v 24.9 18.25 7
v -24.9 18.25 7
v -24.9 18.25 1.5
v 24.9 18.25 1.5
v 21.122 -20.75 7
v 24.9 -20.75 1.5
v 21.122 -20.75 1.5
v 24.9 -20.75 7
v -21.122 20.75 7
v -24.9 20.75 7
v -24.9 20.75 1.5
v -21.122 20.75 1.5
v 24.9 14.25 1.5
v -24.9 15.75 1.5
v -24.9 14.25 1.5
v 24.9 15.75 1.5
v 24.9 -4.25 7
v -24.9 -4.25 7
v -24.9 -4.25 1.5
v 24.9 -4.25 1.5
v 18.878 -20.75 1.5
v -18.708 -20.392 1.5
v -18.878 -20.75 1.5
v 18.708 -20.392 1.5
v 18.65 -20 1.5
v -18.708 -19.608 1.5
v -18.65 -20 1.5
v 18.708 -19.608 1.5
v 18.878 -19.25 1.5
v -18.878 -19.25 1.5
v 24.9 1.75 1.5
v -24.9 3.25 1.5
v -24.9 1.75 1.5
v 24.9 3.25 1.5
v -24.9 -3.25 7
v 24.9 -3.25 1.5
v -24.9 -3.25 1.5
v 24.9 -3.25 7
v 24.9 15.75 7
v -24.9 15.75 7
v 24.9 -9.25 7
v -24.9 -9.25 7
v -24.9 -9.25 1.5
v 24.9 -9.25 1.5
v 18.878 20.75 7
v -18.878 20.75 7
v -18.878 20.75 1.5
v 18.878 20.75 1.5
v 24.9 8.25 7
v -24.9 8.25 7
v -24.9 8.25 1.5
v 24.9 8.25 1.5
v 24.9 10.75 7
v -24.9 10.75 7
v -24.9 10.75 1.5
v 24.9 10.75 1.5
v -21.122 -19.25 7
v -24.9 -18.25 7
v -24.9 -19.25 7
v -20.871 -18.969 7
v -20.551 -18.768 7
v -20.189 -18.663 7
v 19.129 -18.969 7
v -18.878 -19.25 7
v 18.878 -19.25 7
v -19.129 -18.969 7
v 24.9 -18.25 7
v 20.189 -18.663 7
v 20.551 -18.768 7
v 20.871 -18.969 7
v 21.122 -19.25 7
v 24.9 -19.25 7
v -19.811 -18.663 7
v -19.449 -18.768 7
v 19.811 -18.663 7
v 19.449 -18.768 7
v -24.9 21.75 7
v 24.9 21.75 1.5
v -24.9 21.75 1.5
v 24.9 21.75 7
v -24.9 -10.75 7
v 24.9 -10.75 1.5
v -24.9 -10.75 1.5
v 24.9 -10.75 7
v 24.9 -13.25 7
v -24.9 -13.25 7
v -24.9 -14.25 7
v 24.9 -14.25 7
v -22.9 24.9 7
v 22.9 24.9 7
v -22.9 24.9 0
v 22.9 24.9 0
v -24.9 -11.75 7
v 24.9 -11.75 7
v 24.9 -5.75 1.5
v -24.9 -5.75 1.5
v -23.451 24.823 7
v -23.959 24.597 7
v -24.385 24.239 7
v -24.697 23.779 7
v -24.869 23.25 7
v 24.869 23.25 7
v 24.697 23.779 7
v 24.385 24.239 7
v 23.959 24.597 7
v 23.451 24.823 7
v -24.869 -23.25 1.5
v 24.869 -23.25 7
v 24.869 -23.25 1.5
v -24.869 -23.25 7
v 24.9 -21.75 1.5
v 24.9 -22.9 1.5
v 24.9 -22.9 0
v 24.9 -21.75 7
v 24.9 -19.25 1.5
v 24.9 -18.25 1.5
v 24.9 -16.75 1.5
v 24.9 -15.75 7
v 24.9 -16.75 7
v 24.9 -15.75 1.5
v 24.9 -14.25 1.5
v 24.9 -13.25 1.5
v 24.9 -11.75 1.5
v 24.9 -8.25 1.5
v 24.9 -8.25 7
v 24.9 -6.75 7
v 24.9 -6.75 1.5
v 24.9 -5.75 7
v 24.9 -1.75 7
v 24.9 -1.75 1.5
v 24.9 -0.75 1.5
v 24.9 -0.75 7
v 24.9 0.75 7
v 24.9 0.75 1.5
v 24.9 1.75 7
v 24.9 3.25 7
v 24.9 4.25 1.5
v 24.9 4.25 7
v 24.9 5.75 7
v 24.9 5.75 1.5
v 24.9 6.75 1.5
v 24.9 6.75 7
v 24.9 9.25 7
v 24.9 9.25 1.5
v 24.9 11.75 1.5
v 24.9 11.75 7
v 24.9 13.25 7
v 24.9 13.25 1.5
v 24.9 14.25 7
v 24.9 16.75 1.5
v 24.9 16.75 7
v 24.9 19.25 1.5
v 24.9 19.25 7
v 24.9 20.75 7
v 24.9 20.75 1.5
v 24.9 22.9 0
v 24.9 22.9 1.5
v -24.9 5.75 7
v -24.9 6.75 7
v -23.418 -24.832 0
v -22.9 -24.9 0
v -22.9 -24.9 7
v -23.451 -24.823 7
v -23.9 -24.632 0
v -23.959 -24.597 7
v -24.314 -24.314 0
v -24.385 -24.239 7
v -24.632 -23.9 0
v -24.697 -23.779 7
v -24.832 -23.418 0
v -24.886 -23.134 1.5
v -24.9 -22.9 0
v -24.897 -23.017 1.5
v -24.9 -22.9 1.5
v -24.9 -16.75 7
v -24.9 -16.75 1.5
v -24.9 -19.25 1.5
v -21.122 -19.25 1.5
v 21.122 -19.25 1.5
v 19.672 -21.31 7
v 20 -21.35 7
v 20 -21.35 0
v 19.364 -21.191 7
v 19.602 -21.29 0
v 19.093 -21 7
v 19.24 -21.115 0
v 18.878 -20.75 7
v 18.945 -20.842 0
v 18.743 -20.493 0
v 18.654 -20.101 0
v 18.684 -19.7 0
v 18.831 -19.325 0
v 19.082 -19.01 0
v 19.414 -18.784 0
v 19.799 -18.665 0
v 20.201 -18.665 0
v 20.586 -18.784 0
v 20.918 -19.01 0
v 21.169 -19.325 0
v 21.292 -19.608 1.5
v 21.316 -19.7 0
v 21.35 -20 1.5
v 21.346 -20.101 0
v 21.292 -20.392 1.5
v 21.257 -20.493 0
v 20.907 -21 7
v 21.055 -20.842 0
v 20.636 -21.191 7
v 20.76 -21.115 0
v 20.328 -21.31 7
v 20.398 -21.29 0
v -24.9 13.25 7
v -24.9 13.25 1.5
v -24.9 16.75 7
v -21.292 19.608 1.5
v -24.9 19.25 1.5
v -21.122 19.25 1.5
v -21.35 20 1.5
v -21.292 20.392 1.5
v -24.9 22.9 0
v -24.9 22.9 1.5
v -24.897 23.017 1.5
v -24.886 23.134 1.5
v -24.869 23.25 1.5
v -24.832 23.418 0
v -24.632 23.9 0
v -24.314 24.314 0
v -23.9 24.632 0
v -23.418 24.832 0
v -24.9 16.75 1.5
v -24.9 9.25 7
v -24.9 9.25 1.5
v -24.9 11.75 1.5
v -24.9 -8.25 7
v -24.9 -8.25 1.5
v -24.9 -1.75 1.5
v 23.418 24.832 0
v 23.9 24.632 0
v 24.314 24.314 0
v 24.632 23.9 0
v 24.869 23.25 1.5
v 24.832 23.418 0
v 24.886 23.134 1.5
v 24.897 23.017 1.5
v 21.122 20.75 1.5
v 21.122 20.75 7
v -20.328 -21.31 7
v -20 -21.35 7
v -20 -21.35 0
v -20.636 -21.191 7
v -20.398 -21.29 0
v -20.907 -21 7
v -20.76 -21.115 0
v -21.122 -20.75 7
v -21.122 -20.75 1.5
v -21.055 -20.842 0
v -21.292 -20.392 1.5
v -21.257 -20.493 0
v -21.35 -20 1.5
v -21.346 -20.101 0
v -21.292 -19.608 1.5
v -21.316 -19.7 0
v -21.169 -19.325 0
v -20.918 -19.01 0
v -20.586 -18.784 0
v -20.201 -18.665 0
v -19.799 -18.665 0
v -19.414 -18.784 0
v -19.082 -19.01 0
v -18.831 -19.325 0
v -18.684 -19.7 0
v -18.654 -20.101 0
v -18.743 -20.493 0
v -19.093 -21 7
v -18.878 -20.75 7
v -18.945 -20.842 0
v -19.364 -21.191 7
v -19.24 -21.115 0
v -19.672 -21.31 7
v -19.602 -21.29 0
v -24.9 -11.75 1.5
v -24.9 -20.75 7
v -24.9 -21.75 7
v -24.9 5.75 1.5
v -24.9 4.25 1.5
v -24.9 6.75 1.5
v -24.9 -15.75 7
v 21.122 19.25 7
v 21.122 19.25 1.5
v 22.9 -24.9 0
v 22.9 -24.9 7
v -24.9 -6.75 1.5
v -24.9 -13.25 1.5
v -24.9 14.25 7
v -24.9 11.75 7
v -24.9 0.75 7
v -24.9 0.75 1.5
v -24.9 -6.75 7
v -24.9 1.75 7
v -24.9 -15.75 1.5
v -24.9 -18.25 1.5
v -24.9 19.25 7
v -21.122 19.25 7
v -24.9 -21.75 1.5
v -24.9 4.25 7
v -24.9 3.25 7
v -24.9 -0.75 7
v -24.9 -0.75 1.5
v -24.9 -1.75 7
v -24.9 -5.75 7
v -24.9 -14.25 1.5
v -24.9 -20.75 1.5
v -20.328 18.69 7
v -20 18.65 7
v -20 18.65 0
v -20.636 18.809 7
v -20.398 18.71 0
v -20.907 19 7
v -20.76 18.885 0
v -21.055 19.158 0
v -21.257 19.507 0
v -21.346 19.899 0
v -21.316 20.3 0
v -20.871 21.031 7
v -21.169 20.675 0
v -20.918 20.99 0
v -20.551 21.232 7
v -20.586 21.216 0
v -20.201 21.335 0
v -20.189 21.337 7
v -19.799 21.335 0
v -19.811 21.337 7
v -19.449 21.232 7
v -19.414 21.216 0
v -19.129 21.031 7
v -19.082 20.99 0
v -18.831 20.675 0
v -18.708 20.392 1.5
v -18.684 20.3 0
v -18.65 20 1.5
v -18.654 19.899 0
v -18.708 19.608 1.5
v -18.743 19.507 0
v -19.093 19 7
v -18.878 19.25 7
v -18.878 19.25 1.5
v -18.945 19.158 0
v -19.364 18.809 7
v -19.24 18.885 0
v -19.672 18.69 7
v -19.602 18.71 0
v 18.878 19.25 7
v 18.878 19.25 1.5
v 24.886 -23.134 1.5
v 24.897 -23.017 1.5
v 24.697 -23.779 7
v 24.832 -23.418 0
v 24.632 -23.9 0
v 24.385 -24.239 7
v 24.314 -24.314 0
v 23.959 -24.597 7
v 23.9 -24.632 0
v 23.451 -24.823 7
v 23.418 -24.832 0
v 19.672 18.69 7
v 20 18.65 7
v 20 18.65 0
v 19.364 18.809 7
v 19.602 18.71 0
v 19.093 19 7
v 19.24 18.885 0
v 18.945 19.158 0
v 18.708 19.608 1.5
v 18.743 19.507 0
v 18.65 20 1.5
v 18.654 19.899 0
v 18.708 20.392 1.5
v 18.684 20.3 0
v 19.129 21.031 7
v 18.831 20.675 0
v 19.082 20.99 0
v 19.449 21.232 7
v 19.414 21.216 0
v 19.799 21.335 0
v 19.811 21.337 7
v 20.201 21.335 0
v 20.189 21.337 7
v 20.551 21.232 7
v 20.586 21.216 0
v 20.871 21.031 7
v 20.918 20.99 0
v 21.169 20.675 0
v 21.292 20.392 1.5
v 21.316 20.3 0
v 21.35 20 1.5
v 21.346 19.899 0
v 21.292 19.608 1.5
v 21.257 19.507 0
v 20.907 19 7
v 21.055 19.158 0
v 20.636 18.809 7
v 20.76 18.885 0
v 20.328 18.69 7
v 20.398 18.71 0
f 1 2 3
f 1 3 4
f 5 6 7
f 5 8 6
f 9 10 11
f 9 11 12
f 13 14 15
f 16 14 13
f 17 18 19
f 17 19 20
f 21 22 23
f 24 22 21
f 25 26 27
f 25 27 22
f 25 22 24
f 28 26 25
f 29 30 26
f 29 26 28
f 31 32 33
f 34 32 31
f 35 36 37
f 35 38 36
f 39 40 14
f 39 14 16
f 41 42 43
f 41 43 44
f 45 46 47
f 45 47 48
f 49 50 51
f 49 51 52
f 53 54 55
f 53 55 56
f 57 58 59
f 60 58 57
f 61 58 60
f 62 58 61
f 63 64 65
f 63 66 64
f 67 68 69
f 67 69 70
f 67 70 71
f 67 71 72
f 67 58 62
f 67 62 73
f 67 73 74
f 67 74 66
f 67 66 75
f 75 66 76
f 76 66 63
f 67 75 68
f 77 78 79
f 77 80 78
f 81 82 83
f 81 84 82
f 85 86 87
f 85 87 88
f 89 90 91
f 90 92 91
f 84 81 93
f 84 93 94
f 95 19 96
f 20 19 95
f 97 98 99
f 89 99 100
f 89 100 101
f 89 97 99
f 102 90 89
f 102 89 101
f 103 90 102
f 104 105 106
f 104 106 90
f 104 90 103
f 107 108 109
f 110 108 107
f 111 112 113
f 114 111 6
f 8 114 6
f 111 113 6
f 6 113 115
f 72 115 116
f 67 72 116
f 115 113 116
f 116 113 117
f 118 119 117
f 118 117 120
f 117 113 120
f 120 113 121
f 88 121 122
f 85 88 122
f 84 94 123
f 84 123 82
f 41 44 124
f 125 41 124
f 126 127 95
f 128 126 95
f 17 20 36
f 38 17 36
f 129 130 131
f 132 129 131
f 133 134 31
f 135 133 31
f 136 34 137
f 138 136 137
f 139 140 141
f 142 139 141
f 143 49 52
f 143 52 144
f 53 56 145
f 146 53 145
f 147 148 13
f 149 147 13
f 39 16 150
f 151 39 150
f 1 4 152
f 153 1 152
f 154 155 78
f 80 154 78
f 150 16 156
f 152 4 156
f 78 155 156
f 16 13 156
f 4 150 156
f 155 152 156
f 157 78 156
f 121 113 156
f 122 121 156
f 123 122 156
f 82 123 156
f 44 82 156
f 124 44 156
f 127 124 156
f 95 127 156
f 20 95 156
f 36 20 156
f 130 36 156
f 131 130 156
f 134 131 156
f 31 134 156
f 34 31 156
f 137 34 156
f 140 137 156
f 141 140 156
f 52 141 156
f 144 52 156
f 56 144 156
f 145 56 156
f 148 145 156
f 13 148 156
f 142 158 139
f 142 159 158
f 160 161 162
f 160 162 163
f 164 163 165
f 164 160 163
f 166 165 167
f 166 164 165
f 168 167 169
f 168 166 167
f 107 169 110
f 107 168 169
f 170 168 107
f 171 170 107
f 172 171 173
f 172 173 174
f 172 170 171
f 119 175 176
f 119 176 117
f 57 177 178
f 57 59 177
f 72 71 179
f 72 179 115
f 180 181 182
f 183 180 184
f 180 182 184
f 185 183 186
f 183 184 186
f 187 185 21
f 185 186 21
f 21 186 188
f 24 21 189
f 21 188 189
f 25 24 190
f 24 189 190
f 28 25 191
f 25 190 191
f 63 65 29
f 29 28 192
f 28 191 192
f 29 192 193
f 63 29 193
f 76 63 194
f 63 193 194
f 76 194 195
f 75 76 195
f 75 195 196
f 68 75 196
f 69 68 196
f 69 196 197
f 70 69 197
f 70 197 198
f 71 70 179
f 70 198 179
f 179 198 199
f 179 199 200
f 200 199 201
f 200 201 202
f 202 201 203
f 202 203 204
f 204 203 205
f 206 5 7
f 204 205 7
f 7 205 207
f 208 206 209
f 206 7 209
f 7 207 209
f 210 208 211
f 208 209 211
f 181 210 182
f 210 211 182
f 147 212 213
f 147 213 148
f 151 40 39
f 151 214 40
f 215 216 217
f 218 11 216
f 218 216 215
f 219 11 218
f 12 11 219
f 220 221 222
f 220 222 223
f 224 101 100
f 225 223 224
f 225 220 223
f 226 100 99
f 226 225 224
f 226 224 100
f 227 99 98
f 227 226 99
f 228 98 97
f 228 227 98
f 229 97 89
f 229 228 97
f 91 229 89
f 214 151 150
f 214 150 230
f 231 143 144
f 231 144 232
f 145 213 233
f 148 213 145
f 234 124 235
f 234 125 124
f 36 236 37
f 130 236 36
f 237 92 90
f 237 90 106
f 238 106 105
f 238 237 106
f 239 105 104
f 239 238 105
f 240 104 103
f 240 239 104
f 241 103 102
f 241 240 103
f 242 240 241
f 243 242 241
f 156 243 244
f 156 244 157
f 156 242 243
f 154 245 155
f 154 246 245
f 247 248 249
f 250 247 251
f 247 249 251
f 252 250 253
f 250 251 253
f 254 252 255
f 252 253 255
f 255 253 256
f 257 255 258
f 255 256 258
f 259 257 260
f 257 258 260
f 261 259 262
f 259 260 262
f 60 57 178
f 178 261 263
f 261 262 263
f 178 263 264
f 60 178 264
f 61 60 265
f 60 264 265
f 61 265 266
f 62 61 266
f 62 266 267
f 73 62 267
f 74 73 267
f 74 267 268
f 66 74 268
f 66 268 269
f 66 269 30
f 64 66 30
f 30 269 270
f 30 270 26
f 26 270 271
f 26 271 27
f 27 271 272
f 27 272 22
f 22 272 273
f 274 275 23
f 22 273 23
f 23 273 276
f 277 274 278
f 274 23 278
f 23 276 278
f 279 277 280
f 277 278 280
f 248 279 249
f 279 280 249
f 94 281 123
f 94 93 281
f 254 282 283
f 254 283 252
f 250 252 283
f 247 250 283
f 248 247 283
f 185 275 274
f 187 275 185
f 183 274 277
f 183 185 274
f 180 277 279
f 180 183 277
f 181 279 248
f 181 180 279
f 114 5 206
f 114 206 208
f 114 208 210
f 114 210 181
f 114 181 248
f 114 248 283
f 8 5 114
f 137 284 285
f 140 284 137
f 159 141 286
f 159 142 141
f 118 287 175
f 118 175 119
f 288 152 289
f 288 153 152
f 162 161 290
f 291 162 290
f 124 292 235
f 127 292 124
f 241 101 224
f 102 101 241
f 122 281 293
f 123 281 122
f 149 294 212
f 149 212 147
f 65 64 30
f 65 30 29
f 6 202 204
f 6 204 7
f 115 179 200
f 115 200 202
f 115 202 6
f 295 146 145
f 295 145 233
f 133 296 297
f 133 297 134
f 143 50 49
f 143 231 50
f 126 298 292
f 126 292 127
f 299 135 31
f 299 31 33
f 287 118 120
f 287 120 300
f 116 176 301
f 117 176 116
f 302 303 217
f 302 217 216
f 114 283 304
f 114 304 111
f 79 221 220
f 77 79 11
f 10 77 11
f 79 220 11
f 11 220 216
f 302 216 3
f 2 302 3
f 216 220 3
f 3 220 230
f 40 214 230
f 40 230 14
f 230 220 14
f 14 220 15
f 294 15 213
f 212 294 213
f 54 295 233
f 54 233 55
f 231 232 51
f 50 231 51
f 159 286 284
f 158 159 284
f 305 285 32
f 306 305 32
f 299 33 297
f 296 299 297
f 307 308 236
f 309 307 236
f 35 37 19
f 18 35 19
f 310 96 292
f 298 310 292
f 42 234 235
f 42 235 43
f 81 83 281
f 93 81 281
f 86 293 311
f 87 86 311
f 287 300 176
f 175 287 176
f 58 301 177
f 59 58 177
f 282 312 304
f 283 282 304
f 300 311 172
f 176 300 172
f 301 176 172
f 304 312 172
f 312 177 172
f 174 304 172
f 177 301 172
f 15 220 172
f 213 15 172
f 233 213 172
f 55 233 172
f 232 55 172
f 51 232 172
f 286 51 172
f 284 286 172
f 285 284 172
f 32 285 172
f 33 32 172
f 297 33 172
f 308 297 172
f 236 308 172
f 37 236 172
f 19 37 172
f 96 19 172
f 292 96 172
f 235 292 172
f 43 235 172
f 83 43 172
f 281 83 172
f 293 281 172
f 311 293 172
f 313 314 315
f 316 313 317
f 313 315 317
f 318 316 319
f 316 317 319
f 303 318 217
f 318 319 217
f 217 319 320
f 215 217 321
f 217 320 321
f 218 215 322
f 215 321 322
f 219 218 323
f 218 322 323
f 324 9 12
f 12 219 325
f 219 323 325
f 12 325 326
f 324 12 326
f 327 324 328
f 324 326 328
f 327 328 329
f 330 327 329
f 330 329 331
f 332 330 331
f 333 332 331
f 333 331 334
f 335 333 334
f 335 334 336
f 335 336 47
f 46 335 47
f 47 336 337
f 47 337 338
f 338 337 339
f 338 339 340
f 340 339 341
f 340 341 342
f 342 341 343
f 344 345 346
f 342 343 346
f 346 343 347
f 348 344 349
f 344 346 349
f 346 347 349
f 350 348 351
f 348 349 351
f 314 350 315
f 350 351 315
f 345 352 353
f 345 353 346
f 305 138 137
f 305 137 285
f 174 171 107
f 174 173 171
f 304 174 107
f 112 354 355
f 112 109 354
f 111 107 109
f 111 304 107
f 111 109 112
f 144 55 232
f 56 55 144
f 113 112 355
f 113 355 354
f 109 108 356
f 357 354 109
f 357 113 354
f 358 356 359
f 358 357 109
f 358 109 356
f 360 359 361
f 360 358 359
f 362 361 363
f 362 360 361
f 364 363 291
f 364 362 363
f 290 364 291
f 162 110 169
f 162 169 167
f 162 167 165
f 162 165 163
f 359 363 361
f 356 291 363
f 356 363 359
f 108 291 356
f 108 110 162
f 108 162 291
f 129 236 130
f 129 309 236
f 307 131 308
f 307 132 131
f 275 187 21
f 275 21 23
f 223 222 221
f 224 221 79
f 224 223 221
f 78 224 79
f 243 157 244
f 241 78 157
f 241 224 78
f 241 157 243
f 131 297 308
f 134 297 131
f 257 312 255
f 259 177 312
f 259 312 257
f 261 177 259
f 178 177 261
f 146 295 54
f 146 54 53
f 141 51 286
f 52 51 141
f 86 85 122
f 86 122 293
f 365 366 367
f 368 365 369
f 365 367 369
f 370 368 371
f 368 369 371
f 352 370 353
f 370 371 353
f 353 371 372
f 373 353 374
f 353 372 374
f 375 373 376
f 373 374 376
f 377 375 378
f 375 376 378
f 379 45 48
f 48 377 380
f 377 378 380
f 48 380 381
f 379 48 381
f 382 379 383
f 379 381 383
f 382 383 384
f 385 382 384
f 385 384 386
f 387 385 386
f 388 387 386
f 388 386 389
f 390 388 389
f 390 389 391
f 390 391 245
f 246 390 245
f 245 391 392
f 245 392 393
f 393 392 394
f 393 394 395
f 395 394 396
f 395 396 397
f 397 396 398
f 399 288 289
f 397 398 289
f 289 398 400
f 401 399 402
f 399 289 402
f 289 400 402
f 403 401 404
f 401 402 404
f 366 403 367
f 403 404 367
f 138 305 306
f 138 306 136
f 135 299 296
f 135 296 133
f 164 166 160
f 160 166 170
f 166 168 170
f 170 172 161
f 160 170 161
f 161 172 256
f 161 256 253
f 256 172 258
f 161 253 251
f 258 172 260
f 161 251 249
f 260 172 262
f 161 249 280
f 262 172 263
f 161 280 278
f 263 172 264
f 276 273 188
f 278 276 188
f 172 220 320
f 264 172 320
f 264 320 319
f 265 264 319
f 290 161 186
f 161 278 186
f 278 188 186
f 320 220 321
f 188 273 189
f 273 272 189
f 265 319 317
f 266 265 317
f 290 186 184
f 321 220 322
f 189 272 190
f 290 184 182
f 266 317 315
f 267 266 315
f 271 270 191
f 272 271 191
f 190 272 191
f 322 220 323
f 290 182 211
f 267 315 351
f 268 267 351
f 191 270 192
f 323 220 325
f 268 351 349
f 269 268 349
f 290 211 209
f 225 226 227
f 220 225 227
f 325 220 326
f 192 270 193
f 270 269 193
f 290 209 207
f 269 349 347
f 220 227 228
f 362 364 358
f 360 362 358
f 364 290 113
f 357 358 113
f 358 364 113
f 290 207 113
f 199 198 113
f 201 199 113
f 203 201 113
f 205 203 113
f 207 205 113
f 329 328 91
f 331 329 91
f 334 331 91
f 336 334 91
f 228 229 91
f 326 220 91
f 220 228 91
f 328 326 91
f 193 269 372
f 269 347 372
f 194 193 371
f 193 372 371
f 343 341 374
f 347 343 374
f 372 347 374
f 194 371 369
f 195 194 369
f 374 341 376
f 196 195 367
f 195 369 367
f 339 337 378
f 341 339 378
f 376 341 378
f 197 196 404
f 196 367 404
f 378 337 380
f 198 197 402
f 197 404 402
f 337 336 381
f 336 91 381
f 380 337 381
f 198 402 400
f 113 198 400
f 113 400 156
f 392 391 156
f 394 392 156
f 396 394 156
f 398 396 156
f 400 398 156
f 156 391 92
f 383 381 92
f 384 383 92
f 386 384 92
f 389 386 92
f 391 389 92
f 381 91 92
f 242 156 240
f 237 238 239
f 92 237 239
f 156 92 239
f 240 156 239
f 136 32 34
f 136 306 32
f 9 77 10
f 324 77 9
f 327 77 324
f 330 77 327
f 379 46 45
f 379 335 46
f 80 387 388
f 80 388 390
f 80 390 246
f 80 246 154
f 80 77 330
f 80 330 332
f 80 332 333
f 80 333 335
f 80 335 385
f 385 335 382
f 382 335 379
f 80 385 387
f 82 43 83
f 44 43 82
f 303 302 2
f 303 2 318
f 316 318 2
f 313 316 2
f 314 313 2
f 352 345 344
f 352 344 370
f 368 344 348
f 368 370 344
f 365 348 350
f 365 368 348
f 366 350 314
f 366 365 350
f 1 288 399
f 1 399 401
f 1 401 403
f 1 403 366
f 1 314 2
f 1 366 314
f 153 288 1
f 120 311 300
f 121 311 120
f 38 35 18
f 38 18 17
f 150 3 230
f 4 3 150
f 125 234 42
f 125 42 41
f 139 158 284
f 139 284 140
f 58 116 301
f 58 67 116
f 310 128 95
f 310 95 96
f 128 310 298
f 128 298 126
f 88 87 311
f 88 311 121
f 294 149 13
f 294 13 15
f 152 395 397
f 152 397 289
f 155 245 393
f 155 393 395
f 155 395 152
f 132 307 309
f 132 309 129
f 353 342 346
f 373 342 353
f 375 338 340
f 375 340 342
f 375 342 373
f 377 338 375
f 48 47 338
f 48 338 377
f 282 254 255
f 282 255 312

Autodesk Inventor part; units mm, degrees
ref_plane "YZ Plane" through (0, 0, 0) normal (1, 0, 0) x (0, 1, 0)
ref_plane "XZ Plane" through (0, 0, 0) normal (0, 1, 0) x (-1, 0, 0)
ref_plane "XY Plane" through (0, 0, 0) normal (0, 0, 1) x (1, 0, 0)
ref_plane "Arbeitsebene1" through (0, 0, 0) normal (0, 0, 1) x (1, 0, 0)
sketch "Skizze1" plane through (0, 0, 0) normal (0, 0, 1) x (1, 0, 0)
  arc A0 (-22.9, 24.9) -> (-24.9, 22.9) centre (-22.9, 22.9) ccw projected
  line L0 (-24.9, 22.9) -> (-24.9, -22.9) projected
  arc A1 (-24.9, -22.9) -> (-22.9, -24.9) centre (-22.9, -22.9) ccw projected
  line L1 (-22.9, -24.9) -> (22.9, -24.9) projected
  arc A2 (22.9, -24.9) -> (24.9, -22.9) centre (22.9, -22.9) ccw projected
  line L2 (24.9, -22.9) -> (24.9, 22.9) projected
  arc A3 (24.9, 22.9) -> (22.9, 24.9) centre (22.9, 22.9) ccw projected
  line L3 (22.9, 24.9) -> (-22.9, 24.9) projected
  circle A4 centre (20, 20) radius 1.6 projected
  circle A5 centre (-20, -20) radius 1.6 projected
  circle A6 centre (20, -20) radius 1.6 projected
  circle A7 centre (-20, 20) radius 1.6 projected
  arc A8 (6.7383, -21.066) -> (8.3017, -21.066) centre (7.52, -20.62) ccw projected
  line L4 (6.7383, -21.066) -> (-6.9383, -21.066) projected
  arc A9 (-8.5017, -21.066) -> (-6.9383, -21.066) centre (-7.72, -20.62) ccw projected
  line L5 (-8.5017, -21.066) -> (-17.9, -21.066) projected
  line L6 (-17.9, -21.066) -> (-17.9, 21.066) projected
  line L7 (-17.9, 21.066) -> (17.9, 21.066) projected
  line L8 (17.9, 21.066) -> (17.9, 12) projected
  arc A10 (14.9, 9) -> (17.9, 12) centre (14.9, 12) ccw projected
  line L9 (14.5, 9) -> (14.9, 9) projected
  arc A11 (14.5, 9) -> (11.5, 6) centre (14.5, 6) ccw projected
  line L10 (11.5, -6) -> (11.5, 6) projected
  arc A12 (11.5, -6) -> (14.5, -9) centre (14.5, -6) ccw projected
  line L11 (14.9, -9) -> (14.5, -9) projected
  arc A13 (17.9, -12) -> (14.9, -9) centre (14.9, -12) ccw projected
  line L12 (17.9, -12) -> (17.9, -21.066) projected
  line L13 (17.9, -21.066) -> (8.3017, -21.066) projected
  arc A14 (13.4381, 5.6873) -> (13.3881, 5.2) centre (15.7881, 5.2) ccw projected
  line L14 (13.4381, 5.6873) -> (13.4381, 7.6) projected
  line L15 (13.4381, 7.6) -> (15.7881, 7.6) projected
  arc A15 (18.1881, 5.2) -> (15.7881, 7.6) centre (15.7881, 5.2) ccw projected
  line L16 (18.1881, 5.2) -> (18.1881, -5.2) projected
  arc A16 (15.7881, -7.6) -> (18.1881, -5.2) centre (15.7881, -5.2) ccw projected
  line L17 (15.7881, -7.6) -> (13.4381, -7.6) projected
  line L18 (13.4381, -7.6) -> (13.4381, -5.6873) projected
  arc A17 (13.3881, -5.2) -> (13.4381, -5.6873) centre (15.7881, -5.2) ccw projected
  line L19 (13.3881, -5.2) -> (13.3881, 5.2) projected
  line L20 (17.9, 21.066) -> (17.9, -21.066)
  point P0 (0, 0)
extrude "Extrusion1" add sketch "Skizze1" along normal blind 7 contours L3 A3 L2 A2 L1 A1 L0 A0 | A4 | A5 | A6 | A7 | L4 A9 L5 L6 L7 L8 A10 L9 A11 L10 A12 L11 A13 L12 L13 A8 | A13 L11 A12 L10 A11 L9 A10 L20 A15 L15 L14 A14 L19 A17 L18 L17 A16 | L20 A15 L16 A16 | A16 L17 L18 A17 L19 A14 L14 L15 A15 L20
sketch "Skizze2" plane through (0, 0, 7) normal (0, 0, 1) x (1, 0, 0)
  circle A0 centre (-20, 20) radius 1.6 projected
  circle A1 centre (20, 20) radius 1.6 projected
  circle A2 centre (20, -20) radius 1.6 projected
  circle A3 centre (-20, -20) radius 1.6 projected
  line L0 (24.9, -22.9) -> (24.9, 22.9) projected
  line L1 (-24.9, 0.75) -> (24.9, 0.75)
  line L2 (24.9, 0.75) -> (24.9, -0.75)
  line L3 (24.9, -0.75) -> (-24.9, -0.75)
  line L4 (-24.9, -0.75) -> (-24.9, 0.75)
  line L5 (-24.9, 0.75) -> (24.9, -0.75) construction
  line L6 (24.9, 0.75) -> (-24.9, -0.75) construction
  point P0 (0, 0)
  dimension "d2" = 1.5
extrude "Extrusion2" cut sketch "Skizze2" against normal blind 5.5 contours L3 L4 L1 L0
pattern_linear "Rechteckige Anordnung1" count 10 spacing 2.5 along (0, -1, 0) count 10 spacing 2.5 along (0, 1, 0) of "Extrusion2"
sketch "Skizze3" plane through (0, 0, 7) normal (0, 0, 1) x (1, 0, 0)
  circle A0 centre (-20, -20) radius 1.6 projected
  line L0 (18.8686, -21.1314) -> (18.4, -21.6) projected
  arc A1 (22.9, -19.2319) -> (19.2319, -22.9) centre (20, -20) ccw projected
  circle A2 centre (20, 20) radius 1.6 projected
  circle A3 centre (-20, 20) radius 1.6 projected
  point P0 (0, 0)
hole "Bohrung1" at (-20, 20, 7) at (20, 20, 7) at (20, -20, 7) at (-20, -20, 7) direction (0, 0, -1) diameter 2.7 end through all
properties part number "10_Cube_sampleholder"
